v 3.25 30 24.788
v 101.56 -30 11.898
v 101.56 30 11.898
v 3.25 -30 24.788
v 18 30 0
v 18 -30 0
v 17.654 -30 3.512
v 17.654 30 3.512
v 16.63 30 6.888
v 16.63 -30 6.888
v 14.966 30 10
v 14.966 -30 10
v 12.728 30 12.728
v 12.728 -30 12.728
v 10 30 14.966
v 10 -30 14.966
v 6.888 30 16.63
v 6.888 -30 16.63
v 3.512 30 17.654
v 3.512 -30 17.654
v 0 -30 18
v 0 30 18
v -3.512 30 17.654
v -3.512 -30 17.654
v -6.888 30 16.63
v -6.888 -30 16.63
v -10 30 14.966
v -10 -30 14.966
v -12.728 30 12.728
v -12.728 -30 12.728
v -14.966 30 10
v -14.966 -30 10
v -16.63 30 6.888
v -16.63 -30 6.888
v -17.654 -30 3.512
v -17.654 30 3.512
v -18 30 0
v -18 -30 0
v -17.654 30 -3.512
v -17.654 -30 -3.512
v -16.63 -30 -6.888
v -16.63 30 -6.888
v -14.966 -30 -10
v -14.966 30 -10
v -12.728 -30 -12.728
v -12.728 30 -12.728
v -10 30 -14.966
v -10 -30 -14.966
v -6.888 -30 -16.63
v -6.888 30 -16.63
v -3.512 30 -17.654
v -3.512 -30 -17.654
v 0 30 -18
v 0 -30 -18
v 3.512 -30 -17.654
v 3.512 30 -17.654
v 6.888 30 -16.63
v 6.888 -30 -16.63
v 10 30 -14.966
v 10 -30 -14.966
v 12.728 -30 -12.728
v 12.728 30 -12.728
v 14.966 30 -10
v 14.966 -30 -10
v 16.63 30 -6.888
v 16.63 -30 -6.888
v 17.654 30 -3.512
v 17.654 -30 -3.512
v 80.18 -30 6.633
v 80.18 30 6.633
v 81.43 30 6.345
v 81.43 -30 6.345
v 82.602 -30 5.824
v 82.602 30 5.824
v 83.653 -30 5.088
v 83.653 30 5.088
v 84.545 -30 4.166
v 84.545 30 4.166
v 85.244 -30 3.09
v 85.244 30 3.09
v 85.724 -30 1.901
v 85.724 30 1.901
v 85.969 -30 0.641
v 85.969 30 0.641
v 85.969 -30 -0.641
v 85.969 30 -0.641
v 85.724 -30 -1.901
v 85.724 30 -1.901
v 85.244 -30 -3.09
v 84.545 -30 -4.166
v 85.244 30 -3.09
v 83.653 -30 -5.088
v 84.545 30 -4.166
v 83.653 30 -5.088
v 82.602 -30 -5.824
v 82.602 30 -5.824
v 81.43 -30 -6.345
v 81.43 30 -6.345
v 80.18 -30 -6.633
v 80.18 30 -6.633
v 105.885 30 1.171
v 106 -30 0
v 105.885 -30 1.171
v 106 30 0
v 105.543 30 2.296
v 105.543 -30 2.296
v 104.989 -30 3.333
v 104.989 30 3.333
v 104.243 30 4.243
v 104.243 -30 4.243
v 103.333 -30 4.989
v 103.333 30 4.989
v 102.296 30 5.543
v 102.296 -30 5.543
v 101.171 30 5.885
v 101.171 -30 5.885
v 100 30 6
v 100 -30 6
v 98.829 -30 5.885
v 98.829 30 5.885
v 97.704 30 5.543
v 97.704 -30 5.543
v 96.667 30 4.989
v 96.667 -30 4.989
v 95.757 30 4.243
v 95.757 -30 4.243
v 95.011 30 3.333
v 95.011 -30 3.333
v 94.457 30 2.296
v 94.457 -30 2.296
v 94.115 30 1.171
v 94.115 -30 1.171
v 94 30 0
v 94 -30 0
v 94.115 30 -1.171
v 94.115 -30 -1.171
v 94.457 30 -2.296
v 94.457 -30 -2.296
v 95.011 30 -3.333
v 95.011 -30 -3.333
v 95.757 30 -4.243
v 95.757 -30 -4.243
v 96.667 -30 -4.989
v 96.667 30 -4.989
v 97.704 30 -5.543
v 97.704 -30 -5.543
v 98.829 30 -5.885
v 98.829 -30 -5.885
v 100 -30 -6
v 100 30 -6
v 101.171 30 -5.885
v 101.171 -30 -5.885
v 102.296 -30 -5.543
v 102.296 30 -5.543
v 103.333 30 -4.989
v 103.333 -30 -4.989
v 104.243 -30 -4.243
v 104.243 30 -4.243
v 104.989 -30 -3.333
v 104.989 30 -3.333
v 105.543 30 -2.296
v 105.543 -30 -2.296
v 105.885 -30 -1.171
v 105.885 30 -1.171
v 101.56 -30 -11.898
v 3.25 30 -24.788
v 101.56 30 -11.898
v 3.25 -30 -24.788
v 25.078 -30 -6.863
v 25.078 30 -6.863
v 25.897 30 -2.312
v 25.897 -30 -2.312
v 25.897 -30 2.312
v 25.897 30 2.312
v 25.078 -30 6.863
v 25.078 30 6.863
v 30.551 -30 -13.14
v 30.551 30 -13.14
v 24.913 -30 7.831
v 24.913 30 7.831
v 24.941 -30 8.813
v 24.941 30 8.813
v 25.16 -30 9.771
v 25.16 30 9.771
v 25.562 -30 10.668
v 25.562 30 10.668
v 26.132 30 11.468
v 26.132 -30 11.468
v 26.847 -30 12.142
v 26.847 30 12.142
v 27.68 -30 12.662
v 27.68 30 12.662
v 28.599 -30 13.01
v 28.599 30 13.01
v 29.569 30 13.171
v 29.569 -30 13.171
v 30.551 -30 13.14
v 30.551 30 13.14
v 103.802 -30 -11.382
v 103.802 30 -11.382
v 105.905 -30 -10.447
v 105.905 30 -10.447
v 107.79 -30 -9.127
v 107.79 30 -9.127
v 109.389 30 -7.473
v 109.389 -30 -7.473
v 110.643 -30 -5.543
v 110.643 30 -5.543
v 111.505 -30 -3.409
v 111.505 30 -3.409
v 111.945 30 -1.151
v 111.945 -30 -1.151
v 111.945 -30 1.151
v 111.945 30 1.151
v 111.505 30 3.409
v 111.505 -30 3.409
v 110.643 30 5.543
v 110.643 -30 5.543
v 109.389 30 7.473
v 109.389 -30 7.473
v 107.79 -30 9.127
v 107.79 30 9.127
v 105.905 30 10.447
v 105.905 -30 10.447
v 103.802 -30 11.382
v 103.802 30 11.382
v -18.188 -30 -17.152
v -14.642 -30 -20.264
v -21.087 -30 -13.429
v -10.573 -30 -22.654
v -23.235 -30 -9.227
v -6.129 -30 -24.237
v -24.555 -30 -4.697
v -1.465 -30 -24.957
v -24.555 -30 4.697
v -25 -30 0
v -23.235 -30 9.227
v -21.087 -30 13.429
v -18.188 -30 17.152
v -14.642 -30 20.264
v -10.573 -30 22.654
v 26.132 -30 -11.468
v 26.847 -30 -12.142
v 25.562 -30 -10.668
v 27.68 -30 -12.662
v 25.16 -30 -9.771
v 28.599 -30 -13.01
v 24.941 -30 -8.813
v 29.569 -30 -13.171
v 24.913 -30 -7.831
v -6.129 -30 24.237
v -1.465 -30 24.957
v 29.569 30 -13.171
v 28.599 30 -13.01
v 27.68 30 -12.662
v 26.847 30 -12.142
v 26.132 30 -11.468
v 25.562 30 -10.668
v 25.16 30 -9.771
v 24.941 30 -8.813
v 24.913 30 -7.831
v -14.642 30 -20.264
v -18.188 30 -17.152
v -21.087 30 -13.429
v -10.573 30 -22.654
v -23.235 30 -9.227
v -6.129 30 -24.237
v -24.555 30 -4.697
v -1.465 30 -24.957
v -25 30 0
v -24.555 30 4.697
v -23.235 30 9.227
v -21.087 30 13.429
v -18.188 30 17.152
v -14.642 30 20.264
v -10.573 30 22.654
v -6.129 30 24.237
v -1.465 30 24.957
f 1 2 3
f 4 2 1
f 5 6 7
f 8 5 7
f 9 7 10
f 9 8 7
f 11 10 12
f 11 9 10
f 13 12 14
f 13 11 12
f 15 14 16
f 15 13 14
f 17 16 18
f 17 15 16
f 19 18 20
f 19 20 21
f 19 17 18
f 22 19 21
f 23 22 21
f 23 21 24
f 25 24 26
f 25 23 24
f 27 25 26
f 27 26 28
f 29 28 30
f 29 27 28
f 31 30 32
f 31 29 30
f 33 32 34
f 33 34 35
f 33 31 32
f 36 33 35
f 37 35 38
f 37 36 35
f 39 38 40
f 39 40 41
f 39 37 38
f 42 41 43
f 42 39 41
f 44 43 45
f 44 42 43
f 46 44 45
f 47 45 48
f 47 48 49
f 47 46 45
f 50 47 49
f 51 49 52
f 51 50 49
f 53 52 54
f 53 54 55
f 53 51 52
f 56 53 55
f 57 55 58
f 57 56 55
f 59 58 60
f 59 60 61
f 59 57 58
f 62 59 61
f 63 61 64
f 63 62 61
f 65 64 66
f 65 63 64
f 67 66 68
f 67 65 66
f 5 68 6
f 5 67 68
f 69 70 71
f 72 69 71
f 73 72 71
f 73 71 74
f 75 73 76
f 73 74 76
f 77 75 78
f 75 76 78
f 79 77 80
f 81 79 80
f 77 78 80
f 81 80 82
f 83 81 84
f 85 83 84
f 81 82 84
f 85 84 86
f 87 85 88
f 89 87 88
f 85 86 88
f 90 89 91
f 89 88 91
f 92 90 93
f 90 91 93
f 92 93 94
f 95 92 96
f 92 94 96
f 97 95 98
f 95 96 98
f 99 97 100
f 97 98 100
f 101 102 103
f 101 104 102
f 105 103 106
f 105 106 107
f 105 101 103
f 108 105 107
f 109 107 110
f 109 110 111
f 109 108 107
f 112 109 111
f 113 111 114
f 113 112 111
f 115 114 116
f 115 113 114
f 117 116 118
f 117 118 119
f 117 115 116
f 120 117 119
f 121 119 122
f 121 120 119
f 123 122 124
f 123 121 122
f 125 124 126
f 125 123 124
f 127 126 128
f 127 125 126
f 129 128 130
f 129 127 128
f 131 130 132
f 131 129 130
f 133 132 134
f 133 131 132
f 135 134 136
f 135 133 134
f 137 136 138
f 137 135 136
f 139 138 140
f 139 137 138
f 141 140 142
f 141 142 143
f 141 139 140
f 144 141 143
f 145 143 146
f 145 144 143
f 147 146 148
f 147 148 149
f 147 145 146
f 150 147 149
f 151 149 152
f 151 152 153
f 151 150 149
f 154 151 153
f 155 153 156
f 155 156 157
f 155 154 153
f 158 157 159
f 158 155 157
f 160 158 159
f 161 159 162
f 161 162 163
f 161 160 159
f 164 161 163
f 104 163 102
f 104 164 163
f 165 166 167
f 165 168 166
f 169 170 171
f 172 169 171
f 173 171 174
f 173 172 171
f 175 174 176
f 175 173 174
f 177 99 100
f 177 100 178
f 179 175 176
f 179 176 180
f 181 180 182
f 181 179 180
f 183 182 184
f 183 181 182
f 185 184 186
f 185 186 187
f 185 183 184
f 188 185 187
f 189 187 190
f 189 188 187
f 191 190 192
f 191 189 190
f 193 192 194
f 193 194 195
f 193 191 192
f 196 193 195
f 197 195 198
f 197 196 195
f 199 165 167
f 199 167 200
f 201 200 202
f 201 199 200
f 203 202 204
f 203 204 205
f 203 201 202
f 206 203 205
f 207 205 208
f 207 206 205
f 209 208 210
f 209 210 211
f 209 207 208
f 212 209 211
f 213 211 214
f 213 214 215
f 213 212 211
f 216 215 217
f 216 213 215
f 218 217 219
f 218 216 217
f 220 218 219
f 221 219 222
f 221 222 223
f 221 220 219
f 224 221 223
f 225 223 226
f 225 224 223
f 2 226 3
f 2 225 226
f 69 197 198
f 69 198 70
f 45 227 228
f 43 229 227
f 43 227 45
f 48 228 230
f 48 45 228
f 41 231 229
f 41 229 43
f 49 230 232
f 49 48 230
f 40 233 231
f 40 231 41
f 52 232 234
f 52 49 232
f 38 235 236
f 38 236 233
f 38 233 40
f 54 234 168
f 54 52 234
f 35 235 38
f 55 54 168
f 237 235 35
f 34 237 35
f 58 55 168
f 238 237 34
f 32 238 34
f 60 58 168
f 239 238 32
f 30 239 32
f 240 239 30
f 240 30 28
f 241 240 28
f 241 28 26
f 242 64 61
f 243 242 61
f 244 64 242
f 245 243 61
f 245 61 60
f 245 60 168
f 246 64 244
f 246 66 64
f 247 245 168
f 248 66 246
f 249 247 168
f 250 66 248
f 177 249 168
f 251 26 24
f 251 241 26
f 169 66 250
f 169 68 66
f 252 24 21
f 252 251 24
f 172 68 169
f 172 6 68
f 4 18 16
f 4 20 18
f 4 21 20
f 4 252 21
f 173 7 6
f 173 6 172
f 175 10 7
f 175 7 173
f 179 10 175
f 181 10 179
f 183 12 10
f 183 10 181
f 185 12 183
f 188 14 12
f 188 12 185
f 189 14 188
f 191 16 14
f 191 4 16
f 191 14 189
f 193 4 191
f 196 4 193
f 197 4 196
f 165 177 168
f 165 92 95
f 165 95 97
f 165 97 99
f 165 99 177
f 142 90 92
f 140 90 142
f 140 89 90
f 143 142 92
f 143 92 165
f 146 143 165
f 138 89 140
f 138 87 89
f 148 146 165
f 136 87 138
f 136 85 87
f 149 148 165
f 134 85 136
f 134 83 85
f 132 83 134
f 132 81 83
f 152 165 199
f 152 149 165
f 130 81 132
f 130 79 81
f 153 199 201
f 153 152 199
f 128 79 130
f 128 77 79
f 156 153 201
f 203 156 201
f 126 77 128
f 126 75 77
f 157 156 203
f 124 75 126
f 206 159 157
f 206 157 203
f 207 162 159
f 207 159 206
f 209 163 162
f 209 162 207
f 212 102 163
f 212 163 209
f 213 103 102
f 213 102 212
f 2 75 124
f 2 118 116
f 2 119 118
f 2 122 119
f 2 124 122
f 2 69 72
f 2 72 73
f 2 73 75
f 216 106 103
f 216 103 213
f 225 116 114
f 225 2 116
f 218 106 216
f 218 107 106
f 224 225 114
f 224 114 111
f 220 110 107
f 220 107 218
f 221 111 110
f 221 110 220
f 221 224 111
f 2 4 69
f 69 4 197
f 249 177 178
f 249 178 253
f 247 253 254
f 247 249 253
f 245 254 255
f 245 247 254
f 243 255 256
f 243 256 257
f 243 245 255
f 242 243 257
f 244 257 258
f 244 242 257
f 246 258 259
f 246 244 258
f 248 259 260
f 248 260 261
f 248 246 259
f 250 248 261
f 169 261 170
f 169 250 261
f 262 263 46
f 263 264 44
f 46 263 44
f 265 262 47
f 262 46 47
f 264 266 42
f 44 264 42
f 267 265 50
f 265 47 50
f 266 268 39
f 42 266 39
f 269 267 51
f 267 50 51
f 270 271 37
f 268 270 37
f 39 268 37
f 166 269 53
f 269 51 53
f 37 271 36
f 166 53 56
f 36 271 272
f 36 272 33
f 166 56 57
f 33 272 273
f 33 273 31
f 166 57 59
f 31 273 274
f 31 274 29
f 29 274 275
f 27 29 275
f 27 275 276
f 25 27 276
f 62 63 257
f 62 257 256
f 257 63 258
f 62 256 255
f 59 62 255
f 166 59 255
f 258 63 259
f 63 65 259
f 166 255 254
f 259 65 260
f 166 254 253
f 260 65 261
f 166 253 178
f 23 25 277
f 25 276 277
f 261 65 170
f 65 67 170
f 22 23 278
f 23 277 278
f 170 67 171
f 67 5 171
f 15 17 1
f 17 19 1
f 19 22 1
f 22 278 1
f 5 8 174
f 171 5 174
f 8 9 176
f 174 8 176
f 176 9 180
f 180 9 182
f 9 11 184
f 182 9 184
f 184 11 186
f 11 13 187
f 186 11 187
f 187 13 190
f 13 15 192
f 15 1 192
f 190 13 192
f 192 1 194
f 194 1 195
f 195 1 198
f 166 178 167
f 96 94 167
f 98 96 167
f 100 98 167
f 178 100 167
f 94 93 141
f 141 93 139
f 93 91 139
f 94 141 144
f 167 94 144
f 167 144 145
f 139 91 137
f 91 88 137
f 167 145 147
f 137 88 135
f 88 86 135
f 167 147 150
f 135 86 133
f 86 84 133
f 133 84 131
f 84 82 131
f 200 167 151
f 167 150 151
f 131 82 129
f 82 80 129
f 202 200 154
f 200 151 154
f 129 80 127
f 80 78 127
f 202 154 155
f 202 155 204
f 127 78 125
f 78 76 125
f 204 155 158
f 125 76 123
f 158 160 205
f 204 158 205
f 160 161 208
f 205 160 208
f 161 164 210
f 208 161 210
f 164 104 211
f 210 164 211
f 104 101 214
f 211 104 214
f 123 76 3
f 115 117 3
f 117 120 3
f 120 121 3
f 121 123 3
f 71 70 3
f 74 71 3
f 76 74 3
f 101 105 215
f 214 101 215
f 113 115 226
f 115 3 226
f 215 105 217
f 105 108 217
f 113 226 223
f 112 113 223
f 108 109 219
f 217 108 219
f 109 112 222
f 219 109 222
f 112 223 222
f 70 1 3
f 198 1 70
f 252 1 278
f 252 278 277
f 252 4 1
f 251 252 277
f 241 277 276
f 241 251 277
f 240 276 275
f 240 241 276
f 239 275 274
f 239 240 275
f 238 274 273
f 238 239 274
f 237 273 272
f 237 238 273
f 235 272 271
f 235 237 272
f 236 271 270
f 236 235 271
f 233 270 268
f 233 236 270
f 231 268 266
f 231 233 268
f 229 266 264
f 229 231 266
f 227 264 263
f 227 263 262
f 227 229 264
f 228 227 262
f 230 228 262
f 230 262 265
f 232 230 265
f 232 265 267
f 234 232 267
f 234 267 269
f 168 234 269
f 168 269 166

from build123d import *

# Parameters (mm, degrees)
F0_R     = 18
F0_R_2   = 6
F1_DEPTH = 30


with BuildPart() as f1:
    # F0 (on Front) → F1 (new body, symmetric)
    with BuildSketch(Plane.XZ):
        with BuildLine():
            Line((3.25, -24.78785), (101.56, -11.898168))
            ThreePointArc((101.56, -11.898168), (112, 0), (101.56, 11.898168))
            Line((101.56, 11.898168), (3.25, 24.78785))
            ThreePointArc((3.25, 24.78785), (-25, 0), (3.25, -24.78785))
        make_face()
        Circle(F0_R, mode=Mode.SUBTRACT)
        with BuildLine():
            ThreePointArc((25.077968, 6.862616), (26.13184, 11.468083), (30.550655, 13.13992))
            Line((30.550655, 13.13992), (80.18, 6.632887))
            ThreePointArc((80.18, 6.632887), (86, 0), (80.18, -6.632887))
            Line((80.18, -6.632887), (30.550655, -13.13992))
            ThreePointArc((30.550655, -13.13992), (26.13184, -11.468083), (25.077968, -6.862616))
            ThreePointArc((25.077968, -6.862616), (26, 0), (25.077968, 6.862616))
        make_face(mode=Mode.SUBTRACT)
        with Locations((100, 0)):
            Circle(F0_R_2, mode=Mode.SUBTRACT)
    extrude(amount=F1_DEPTH, both=True)


solid = f1.part
